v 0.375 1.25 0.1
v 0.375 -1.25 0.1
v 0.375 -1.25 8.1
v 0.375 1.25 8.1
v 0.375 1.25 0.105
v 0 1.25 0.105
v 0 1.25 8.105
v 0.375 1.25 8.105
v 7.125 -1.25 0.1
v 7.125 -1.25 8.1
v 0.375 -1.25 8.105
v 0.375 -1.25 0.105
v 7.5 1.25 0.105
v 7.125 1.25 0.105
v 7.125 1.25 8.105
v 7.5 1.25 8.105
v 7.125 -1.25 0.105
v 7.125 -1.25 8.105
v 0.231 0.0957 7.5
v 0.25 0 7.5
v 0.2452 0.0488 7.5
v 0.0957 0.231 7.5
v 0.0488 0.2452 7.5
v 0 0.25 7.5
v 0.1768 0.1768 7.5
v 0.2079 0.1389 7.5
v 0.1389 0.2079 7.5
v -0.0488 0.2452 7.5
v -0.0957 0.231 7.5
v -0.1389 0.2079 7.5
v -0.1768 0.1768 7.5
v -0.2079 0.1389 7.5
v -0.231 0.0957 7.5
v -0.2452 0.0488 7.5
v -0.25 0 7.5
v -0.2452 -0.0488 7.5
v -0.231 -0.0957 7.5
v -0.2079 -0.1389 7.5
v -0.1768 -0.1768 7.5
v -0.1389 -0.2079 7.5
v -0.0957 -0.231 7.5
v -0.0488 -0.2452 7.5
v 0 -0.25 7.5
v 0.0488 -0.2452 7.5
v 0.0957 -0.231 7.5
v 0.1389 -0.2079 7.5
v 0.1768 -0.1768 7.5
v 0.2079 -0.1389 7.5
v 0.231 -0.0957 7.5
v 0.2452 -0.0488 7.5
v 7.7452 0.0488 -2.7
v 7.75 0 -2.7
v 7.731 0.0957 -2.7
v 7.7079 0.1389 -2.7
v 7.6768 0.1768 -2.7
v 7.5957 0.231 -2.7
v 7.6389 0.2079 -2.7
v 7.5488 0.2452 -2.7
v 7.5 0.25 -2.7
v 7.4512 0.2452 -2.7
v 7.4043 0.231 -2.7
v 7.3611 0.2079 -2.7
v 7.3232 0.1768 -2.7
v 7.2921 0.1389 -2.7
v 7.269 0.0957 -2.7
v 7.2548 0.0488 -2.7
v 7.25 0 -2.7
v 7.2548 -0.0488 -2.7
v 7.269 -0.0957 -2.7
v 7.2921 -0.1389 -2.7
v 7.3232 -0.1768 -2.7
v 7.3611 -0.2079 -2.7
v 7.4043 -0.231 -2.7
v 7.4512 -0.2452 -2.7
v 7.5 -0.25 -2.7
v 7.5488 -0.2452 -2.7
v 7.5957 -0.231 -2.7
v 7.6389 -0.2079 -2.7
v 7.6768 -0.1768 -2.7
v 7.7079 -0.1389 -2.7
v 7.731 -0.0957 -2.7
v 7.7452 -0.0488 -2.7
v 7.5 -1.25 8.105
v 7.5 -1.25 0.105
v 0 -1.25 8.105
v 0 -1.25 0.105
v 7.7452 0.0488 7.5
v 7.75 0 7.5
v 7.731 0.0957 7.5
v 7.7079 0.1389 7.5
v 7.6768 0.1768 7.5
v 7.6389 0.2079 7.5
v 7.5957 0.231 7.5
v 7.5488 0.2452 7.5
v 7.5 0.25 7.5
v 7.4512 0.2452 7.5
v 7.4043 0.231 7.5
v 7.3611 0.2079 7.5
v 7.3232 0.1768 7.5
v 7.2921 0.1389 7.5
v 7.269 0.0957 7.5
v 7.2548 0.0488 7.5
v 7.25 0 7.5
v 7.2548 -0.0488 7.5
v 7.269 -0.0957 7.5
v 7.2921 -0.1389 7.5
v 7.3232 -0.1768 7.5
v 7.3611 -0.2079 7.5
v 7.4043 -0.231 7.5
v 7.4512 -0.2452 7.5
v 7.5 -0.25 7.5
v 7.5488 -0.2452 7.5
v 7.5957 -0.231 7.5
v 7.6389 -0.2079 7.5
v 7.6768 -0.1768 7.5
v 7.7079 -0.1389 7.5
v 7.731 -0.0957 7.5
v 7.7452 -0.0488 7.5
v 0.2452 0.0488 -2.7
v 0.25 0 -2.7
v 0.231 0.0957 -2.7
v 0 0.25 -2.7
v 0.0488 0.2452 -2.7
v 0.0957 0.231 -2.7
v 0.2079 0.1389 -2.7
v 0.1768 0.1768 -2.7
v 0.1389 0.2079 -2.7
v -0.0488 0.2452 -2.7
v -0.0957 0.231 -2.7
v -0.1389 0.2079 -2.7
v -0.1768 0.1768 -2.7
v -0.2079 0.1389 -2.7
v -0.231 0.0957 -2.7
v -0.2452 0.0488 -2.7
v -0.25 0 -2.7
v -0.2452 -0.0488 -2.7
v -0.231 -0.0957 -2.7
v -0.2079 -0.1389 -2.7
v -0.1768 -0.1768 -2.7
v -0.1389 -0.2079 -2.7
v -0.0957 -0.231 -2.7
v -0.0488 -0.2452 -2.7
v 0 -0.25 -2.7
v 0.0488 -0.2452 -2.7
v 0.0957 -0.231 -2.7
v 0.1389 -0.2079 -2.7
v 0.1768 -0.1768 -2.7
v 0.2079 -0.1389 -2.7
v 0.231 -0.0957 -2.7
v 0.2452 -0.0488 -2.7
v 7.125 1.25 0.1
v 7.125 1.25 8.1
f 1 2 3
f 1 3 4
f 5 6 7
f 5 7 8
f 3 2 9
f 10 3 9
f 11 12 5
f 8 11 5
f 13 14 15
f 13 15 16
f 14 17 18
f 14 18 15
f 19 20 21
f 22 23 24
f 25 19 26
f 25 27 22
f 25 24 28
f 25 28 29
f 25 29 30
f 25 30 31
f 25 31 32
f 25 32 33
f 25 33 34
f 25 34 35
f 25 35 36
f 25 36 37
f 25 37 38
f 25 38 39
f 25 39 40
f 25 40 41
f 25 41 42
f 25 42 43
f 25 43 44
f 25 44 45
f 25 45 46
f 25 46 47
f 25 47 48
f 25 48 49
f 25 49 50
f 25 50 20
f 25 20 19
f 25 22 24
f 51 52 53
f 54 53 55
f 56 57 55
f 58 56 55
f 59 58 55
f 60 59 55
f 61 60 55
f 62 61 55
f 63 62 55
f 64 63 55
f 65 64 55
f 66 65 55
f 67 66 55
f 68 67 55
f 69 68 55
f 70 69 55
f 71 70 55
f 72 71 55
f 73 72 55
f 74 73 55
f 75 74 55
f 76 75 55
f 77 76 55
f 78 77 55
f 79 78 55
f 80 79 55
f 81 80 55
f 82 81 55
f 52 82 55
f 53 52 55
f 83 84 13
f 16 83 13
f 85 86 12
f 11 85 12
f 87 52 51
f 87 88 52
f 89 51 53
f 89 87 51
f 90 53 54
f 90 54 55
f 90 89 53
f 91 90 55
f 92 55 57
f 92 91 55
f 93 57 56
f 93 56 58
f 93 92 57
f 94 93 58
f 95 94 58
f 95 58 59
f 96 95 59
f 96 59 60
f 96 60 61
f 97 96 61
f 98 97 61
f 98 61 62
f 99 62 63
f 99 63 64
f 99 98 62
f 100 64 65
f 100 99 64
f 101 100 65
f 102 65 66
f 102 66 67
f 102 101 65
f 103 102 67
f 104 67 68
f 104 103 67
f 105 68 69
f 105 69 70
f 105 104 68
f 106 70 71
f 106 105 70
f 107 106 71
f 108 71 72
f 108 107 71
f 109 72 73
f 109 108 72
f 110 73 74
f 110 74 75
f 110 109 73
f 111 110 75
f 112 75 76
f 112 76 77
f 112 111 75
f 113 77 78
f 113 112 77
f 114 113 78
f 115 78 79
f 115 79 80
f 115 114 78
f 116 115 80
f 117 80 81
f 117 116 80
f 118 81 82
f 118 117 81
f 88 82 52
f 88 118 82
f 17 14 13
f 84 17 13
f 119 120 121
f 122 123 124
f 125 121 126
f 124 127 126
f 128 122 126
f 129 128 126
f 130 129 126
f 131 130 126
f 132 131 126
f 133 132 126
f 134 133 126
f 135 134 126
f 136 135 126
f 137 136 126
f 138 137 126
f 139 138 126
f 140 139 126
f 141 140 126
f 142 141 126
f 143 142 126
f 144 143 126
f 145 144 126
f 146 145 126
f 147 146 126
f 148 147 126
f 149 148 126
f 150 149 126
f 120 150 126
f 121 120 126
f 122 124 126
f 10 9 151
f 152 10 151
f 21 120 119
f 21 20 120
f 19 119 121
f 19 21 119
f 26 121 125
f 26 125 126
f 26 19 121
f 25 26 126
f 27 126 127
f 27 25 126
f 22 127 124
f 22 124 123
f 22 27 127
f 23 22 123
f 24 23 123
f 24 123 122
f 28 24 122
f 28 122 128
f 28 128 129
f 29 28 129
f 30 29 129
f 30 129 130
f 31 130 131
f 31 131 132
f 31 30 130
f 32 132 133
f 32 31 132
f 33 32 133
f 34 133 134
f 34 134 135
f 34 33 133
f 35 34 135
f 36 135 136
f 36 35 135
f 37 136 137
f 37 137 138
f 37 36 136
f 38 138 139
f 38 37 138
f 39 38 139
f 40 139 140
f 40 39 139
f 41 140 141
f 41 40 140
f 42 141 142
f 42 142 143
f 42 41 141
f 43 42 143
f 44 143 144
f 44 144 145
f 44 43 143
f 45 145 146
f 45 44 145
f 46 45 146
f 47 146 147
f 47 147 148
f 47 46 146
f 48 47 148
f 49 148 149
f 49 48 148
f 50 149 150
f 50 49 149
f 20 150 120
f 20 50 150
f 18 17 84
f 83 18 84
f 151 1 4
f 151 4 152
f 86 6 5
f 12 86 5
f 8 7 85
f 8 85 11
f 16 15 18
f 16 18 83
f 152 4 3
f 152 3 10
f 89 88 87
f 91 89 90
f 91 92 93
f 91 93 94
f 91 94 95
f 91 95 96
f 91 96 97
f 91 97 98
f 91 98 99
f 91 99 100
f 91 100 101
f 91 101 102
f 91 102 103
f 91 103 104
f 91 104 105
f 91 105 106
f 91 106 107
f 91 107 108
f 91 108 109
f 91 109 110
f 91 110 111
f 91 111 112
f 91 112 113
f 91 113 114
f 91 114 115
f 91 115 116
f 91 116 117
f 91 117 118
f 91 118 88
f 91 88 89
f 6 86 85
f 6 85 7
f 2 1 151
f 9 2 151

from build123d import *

# Parameters (mm, degrees)
SKETCH_W          = 6.75
SKETCH_H          = 2.5
PAD_DEPTH         = 8
SKETCH001_R       = 0.25
PAD001_DEPTH      = 7
PAD001_DEPTH_BACK = 3.2
SKETCH002_W       = 0.375
SKETCH002_H       = 2.5
PAD002_DEPTH      = 8


with BuildPart() as pad:
    # Sketch → Pad (new body)
    with BuildSketch(Plane.XY.offset(0.1)):
        with Locations((3.75, 0)):
            Rectangle(SKETCH_W, SKETCH_H)
    extrude(amount=PAD_DEPTH)


with BuildPart() as pad001:
    # Sketch001 → Pad001 (new body, two sides)
    with BuildSketch(Plane.XY.offset(0.5)) as pad001_sk:
        Circle(SKETCH001_R)
        with Locations((7.5, 0)):
            Circle(SKETCH001_R)
    extrude(amount=PAD001_DEPTH)
    extrude(pad001_sk.sketch, amount=-PAD001_DEPTH_BACK)


with BuildPart() as pad002:
    # Sketch002 → Pad002 (new body)
    with BuildSketch(Plane.XY.offset(0.105)):
        with Locations((0.1875, 0)):
            Rectangle(SKETCH002_W, SKETCH002_H)
        with Locations((7.3125, 0)):
            Rectangle(SKETCH002_W, SKETCH002_H)
    extrude(amount=PAD002_DEPTH)


solid = Compound([pad.part, pad001.part, pad002.part])
